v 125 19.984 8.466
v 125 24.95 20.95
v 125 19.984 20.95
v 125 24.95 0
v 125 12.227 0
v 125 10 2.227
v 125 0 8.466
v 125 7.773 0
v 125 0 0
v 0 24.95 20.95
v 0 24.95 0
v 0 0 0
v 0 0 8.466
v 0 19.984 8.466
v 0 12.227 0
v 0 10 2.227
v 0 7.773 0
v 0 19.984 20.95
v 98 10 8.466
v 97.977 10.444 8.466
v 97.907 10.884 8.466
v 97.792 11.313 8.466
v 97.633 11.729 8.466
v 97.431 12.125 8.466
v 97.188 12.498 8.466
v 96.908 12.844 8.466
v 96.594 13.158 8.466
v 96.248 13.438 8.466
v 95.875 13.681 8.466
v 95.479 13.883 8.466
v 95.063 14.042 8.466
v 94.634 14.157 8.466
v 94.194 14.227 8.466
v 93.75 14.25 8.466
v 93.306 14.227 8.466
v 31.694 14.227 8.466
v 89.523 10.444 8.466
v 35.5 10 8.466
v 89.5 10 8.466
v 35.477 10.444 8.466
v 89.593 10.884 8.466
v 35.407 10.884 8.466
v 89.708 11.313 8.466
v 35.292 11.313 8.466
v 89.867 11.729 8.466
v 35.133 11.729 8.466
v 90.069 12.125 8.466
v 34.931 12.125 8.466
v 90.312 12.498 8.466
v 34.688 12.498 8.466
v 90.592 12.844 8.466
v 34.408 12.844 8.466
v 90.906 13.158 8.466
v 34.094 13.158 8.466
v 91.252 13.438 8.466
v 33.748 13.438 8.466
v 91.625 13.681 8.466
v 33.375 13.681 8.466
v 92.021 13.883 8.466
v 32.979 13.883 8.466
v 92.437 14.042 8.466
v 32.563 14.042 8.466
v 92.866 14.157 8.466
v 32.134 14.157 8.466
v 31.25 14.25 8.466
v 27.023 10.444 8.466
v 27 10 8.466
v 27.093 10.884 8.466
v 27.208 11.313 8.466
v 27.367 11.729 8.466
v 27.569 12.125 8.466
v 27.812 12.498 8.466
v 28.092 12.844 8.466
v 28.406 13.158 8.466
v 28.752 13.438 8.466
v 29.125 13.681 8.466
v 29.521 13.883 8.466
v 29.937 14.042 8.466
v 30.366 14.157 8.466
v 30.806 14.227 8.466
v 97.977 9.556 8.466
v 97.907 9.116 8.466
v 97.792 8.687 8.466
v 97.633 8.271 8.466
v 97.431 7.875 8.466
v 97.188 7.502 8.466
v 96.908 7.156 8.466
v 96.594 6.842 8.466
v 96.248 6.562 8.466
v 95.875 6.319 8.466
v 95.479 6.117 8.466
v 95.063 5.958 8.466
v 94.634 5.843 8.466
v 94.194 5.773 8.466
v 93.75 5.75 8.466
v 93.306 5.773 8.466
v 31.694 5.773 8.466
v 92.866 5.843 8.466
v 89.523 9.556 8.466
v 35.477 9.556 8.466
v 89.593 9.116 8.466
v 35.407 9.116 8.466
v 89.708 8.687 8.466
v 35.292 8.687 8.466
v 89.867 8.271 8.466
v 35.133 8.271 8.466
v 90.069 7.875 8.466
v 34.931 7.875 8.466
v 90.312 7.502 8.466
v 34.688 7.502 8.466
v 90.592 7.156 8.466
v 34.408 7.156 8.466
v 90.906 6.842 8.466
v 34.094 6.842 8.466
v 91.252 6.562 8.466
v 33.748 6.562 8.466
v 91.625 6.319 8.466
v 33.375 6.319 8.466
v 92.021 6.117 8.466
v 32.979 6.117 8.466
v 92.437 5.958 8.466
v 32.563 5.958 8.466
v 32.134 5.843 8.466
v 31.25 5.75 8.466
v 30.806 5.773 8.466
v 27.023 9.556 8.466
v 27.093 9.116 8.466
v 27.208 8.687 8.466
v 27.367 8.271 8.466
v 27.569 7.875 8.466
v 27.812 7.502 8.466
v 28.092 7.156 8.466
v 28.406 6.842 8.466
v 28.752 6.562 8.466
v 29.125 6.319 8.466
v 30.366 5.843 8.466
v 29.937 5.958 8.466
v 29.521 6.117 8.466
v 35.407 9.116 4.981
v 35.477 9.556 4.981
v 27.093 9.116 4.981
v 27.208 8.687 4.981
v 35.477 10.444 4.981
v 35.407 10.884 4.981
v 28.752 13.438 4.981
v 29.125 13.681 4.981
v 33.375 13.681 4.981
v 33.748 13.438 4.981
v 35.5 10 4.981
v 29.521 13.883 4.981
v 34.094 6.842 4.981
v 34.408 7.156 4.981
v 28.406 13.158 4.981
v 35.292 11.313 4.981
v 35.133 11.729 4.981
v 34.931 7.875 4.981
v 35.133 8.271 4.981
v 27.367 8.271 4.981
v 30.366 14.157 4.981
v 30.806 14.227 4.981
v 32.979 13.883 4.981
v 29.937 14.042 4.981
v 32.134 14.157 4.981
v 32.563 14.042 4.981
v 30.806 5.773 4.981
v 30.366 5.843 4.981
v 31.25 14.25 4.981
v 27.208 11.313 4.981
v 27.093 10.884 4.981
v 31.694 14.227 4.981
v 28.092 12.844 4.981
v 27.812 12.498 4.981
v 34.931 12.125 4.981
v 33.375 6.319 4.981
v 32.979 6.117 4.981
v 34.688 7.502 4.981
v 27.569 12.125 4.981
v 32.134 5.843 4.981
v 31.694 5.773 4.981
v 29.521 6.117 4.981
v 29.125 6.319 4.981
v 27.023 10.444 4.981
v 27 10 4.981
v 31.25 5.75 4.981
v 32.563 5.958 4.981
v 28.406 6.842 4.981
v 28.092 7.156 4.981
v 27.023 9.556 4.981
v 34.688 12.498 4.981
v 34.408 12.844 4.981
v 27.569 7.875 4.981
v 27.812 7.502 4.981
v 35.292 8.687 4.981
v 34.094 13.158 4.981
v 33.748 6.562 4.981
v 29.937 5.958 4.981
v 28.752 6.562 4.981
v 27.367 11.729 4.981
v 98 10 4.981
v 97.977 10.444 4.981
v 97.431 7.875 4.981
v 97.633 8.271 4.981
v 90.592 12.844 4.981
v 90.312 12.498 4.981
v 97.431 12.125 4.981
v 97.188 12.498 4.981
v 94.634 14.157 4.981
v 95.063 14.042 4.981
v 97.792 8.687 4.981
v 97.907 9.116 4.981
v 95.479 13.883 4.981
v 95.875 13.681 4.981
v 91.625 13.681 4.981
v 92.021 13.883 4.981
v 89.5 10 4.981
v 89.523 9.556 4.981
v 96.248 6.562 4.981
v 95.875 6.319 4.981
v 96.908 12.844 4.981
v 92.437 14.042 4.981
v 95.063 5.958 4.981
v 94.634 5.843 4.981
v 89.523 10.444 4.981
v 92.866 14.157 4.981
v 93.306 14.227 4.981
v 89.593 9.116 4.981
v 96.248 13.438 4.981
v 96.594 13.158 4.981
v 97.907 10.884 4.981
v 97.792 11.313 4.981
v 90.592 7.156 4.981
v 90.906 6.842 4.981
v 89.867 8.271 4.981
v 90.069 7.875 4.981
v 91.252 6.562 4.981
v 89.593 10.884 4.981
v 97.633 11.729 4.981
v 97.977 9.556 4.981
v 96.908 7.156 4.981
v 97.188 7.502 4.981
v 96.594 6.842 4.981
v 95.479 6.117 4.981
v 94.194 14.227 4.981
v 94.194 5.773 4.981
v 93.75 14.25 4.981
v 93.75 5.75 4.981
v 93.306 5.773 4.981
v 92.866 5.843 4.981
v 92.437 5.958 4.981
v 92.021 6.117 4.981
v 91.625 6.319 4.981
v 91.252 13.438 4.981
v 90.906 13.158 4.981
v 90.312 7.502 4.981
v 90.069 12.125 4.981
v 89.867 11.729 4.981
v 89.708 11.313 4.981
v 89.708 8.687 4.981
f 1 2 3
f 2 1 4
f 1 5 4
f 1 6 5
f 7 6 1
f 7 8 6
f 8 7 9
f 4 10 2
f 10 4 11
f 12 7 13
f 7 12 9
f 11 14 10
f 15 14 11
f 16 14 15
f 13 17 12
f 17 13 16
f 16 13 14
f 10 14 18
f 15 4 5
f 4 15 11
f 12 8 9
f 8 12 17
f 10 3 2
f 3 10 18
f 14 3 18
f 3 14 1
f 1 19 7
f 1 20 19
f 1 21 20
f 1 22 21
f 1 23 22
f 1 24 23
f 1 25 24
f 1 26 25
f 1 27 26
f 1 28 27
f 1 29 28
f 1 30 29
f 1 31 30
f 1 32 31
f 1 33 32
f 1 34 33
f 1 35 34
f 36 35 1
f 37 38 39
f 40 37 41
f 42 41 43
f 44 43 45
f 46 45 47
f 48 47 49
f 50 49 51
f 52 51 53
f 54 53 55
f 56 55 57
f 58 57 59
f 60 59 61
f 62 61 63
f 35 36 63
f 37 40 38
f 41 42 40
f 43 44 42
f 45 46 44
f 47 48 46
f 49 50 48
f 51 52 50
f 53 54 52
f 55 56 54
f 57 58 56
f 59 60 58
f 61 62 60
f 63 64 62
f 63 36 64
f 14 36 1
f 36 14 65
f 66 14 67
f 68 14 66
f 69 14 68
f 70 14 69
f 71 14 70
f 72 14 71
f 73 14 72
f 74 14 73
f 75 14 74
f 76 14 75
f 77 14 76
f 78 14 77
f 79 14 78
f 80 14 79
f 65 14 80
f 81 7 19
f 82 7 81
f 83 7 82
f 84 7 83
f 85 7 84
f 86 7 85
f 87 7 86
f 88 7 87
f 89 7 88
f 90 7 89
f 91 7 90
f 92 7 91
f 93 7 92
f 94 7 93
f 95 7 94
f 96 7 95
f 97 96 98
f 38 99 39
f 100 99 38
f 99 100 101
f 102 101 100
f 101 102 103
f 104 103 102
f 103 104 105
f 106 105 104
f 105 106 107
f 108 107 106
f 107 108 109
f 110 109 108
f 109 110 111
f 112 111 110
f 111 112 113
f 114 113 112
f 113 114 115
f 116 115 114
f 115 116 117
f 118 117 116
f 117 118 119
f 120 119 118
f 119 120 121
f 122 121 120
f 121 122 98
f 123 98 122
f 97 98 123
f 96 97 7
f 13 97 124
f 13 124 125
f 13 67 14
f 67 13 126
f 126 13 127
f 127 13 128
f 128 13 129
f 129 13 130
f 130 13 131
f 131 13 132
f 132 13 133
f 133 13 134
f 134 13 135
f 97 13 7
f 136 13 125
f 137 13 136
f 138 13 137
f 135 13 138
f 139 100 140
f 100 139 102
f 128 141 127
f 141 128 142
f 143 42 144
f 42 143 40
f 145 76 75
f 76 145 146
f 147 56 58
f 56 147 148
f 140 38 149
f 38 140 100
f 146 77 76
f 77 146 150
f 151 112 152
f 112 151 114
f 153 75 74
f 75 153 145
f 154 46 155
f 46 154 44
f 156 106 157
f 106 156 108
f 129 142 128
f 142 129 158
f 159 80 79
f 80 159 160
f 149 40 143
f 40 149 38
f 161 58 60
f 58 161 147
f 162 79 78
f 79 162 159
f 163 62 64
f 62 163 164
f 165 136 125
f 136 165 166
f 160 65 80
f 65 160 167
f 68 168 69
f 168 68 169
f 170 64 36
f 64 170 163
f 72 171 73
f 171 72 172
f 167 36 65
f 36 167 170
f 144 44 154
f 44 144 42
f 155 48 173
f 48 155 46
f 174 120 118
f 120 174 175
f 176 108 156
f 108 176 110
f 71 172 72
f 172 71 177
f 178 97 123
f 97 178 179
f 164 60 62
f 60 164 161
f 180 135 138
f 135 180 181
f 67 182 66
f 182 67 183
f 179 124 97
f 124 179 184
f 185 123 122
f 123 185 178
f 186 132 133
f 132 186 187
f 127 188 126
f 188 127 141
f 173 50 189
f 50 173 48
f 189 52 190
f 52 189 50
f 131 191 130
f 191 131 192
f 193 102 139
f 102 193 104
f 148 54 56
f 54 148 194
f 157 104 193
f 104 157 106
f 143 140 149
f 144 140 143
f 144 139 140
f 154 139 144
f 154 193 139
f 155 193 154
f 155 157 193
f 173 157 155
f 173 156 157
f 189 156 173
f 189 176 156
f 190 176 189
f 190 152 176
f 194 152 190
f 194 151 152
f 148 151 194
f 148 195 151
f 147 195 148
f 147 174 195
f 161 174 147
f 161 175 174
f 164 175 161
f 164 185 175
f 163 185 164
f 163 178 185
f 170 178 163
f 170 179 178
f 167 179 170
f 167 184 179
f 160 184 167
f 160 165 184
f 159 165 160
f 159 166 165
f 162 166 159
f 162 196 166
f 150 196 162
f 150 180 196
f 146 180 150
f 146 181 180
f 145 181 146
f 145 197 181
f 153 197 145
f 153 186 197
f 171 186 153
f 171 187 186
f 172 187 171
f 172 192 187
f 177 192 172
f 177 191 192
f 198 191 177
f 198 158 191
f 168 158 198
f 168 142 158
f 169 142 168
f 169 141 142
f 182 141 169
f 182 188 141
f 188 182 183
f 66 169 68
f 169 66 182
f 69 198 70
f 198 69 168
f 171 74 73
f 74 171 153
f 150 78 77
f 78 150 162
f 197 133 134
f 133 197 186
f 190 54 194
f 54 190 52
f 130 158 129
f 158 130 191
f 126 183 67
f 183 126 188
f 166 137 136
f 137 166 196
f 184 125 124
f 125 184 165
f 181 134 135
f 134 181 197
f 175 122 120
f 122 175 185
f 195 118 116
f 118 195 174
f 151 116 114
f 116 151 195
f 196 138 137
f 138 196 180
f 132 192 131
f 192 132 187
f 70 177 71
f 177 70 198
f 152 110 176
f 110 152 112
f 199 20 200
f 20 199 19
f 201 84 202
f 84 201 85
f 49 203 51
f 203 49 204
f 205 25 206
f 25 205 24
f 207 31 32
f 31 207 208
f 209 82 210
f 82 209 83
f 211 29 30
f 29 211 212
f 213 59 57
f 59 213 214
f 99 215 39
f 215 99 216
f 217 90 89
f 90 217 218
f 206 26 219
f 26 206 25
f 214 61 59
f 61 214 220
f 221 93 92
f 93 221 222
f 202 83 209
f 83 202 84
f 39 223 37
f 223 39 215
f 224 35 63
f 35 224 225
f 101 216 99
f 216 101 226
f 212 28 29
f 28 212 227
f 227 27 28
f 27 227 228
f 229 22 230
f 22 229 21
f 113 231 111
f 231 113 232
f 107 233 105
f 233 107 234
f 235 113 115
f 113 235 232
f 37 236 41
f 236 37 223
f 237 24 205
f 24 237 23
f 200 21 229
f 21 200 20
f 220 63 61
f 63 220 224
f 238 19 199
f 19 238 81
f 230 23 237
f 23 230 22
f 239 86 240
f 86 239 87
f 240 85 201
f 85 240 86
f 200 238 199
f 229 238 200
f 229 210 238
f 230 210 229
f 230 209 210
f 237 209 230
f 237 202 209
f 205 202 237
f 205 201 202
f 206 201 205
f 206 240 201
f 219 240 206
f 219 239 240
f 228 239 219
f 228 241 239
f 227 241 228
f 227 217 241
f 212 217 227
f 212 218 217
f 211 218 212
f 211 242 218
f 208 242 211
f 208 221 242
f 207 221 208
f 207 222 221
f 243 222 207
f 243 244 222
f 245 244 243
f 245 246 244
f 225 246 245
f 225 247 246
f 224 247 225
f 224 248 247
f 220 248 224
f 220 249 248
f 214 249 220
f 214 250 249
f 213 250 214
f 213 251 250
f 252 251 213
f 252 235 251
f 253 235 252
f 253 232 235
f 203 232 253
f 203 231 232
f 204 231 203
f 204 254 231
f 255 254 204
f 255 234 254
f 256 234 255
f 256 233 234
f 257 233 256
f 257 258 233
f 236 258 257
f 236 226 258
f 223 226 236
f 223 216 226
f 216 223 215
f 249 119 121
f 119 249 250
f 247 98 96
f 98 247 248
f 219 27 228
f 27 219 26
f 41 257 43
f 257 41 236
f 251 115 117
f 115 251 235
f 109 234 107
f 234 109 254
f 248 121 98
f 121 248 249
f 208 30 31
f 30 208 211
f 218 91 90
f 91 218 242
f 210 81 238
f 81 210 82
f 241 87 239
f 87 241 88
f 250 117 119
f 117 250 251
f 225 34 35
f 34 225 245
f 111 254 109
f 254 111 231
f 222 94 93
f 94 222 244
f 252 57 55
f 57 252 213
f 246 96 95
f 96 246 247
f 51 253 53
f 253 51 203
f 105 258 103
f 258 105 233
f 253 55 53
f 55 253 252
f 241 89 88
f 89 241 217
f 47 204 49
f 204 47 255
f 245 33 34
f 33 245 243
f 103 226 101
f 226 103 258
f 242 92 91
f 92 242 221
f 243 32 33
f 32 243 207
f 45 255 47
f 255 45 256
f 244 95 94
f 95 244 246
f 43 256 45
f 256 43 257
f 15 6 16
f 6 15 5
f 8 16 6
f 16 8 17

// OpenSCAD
// file: ../../globals.scad
//$fa = $preview? 12 : 6;
//$fs = $preview? 2 : 0.2;

EPS = 1/64;

// Used for indexing coordinates since the dot syntax is not
// officialy supported
X = 0;
Y = 1;
Z = 2;

// Slicer defaults
LAYER_HEIGHT = 0.15;
EXTRUSION_WIDTH = 0.45;

function nearest_layer_height(n) = round(n / LAYER_HEIGHT) * LAYER_HEIGHT;
function nearest_extrusion_width(n) = round(n / EXTRUSION_WIDTH) * EXTRUSION_WIDTH;

// Defaults for all parts
WALL_XS = nearest_extrusion_width(1.25);
WALL_S = nearest_extrusion_width(2);
WALL = nearest_extrusion_width(3);
WALL_L = nearest_extrusion_width(5);
WALL_XL = nearest_extrusion_width(7.5);

// Seems to be a good middle ground, corresponds to #8 for imperial ones
SCREW = 4;

// Set up OpenSCAD rendering defaults
$fa = 6;
$fs = EXTRUSION_WIDTH / 2;

function default(v, d) = is_undef(v)? d : v;

// For engraving in all planes except those parrallel to XY.
module v_engrave(t, size=10) {
    translate([0, 0.3, 0])
    rotate([90,0,0])
    linear_extrude(0.3 + EPS)
    text(t, size=size, font="DejaVu Sans:style=Book", valign="center", halign="center", $fn=8);
}

// For engraving in all planes parrallel to XY.
module h_engrave(t, size=10) {
    translate([0, 0, -0.7])
    linear_extrude(0.7 + EPS)
    text(t, size=size, font="DejaVu Sans:style=Book", valign="center", halign="center", $fn=8);
}

// Used for creating screw holes
module screw(height, head_extra_height=0) {
    translate([0,0, -(height + head_extra_height) / 2]) {
        cylinder(height, r=SCREW/2);
        
        translate([0,0,height-SCREW/2])
        cylinder(SCREW/2, r1=SCREW/2, r2=SCREW);
        
        translate([0,0,height - EPS])
        cylinder(head_extra_height + EPS, r=SCREW);
    }
}
// main file
include <../../globals.scad>;

HEIGHT = 20;
LENGTH = 125;
WIDTH = 12.5;

MAGNET_DIAMETER = 8.5;
MAGNET_HEIGHT = 3.5;

V_GROOVE = true;

module jaw_pad(size, magnet_height, magnet_diameter, v_groove = false) {

    translate([0,0,size[Y] + WALL_L + magnet_height])
    rotate([-90,0,0])
    difference() {
        cube([size[X], size[Y] + WALL_L + magnet_height, size[Z] + WALL_L]);
        
        translate([-EPS, -EPS, -EPS])
        cube([size[X] + 2*EPS, size[Y], size[Z]]);
        
        translate([size[X] / 4, size[Y] + magnet_height - 2*EPS, size[Z]/2])
        rotate([90,0,0])
        cylinder(magnet_height, r=magnet_diameter/2);

        translate([size[X] / 4 * 3, size[Y] + magnet_height - 2*EPS, size[Z]/2])
        rotate([90,0,0])
        cylinder(magnet_height, r=magnet_diameter/2);
        
        if(v_groove)
            translate([0, size[Y] + WALL_L + magnet_height, size[Z] / 2])
            rotate([45,0,0])
            translate([-EPS, -WALL/2, -WALL/2])
            cube([size[X] + 2 * EPS, WALL, WALL]);
    }

}

jaw_pad([LENGTH, WIDTH, HEIGHT], MAGNET_HEIGHT, MAGNET_DIAMETER, V_GROOVE);
